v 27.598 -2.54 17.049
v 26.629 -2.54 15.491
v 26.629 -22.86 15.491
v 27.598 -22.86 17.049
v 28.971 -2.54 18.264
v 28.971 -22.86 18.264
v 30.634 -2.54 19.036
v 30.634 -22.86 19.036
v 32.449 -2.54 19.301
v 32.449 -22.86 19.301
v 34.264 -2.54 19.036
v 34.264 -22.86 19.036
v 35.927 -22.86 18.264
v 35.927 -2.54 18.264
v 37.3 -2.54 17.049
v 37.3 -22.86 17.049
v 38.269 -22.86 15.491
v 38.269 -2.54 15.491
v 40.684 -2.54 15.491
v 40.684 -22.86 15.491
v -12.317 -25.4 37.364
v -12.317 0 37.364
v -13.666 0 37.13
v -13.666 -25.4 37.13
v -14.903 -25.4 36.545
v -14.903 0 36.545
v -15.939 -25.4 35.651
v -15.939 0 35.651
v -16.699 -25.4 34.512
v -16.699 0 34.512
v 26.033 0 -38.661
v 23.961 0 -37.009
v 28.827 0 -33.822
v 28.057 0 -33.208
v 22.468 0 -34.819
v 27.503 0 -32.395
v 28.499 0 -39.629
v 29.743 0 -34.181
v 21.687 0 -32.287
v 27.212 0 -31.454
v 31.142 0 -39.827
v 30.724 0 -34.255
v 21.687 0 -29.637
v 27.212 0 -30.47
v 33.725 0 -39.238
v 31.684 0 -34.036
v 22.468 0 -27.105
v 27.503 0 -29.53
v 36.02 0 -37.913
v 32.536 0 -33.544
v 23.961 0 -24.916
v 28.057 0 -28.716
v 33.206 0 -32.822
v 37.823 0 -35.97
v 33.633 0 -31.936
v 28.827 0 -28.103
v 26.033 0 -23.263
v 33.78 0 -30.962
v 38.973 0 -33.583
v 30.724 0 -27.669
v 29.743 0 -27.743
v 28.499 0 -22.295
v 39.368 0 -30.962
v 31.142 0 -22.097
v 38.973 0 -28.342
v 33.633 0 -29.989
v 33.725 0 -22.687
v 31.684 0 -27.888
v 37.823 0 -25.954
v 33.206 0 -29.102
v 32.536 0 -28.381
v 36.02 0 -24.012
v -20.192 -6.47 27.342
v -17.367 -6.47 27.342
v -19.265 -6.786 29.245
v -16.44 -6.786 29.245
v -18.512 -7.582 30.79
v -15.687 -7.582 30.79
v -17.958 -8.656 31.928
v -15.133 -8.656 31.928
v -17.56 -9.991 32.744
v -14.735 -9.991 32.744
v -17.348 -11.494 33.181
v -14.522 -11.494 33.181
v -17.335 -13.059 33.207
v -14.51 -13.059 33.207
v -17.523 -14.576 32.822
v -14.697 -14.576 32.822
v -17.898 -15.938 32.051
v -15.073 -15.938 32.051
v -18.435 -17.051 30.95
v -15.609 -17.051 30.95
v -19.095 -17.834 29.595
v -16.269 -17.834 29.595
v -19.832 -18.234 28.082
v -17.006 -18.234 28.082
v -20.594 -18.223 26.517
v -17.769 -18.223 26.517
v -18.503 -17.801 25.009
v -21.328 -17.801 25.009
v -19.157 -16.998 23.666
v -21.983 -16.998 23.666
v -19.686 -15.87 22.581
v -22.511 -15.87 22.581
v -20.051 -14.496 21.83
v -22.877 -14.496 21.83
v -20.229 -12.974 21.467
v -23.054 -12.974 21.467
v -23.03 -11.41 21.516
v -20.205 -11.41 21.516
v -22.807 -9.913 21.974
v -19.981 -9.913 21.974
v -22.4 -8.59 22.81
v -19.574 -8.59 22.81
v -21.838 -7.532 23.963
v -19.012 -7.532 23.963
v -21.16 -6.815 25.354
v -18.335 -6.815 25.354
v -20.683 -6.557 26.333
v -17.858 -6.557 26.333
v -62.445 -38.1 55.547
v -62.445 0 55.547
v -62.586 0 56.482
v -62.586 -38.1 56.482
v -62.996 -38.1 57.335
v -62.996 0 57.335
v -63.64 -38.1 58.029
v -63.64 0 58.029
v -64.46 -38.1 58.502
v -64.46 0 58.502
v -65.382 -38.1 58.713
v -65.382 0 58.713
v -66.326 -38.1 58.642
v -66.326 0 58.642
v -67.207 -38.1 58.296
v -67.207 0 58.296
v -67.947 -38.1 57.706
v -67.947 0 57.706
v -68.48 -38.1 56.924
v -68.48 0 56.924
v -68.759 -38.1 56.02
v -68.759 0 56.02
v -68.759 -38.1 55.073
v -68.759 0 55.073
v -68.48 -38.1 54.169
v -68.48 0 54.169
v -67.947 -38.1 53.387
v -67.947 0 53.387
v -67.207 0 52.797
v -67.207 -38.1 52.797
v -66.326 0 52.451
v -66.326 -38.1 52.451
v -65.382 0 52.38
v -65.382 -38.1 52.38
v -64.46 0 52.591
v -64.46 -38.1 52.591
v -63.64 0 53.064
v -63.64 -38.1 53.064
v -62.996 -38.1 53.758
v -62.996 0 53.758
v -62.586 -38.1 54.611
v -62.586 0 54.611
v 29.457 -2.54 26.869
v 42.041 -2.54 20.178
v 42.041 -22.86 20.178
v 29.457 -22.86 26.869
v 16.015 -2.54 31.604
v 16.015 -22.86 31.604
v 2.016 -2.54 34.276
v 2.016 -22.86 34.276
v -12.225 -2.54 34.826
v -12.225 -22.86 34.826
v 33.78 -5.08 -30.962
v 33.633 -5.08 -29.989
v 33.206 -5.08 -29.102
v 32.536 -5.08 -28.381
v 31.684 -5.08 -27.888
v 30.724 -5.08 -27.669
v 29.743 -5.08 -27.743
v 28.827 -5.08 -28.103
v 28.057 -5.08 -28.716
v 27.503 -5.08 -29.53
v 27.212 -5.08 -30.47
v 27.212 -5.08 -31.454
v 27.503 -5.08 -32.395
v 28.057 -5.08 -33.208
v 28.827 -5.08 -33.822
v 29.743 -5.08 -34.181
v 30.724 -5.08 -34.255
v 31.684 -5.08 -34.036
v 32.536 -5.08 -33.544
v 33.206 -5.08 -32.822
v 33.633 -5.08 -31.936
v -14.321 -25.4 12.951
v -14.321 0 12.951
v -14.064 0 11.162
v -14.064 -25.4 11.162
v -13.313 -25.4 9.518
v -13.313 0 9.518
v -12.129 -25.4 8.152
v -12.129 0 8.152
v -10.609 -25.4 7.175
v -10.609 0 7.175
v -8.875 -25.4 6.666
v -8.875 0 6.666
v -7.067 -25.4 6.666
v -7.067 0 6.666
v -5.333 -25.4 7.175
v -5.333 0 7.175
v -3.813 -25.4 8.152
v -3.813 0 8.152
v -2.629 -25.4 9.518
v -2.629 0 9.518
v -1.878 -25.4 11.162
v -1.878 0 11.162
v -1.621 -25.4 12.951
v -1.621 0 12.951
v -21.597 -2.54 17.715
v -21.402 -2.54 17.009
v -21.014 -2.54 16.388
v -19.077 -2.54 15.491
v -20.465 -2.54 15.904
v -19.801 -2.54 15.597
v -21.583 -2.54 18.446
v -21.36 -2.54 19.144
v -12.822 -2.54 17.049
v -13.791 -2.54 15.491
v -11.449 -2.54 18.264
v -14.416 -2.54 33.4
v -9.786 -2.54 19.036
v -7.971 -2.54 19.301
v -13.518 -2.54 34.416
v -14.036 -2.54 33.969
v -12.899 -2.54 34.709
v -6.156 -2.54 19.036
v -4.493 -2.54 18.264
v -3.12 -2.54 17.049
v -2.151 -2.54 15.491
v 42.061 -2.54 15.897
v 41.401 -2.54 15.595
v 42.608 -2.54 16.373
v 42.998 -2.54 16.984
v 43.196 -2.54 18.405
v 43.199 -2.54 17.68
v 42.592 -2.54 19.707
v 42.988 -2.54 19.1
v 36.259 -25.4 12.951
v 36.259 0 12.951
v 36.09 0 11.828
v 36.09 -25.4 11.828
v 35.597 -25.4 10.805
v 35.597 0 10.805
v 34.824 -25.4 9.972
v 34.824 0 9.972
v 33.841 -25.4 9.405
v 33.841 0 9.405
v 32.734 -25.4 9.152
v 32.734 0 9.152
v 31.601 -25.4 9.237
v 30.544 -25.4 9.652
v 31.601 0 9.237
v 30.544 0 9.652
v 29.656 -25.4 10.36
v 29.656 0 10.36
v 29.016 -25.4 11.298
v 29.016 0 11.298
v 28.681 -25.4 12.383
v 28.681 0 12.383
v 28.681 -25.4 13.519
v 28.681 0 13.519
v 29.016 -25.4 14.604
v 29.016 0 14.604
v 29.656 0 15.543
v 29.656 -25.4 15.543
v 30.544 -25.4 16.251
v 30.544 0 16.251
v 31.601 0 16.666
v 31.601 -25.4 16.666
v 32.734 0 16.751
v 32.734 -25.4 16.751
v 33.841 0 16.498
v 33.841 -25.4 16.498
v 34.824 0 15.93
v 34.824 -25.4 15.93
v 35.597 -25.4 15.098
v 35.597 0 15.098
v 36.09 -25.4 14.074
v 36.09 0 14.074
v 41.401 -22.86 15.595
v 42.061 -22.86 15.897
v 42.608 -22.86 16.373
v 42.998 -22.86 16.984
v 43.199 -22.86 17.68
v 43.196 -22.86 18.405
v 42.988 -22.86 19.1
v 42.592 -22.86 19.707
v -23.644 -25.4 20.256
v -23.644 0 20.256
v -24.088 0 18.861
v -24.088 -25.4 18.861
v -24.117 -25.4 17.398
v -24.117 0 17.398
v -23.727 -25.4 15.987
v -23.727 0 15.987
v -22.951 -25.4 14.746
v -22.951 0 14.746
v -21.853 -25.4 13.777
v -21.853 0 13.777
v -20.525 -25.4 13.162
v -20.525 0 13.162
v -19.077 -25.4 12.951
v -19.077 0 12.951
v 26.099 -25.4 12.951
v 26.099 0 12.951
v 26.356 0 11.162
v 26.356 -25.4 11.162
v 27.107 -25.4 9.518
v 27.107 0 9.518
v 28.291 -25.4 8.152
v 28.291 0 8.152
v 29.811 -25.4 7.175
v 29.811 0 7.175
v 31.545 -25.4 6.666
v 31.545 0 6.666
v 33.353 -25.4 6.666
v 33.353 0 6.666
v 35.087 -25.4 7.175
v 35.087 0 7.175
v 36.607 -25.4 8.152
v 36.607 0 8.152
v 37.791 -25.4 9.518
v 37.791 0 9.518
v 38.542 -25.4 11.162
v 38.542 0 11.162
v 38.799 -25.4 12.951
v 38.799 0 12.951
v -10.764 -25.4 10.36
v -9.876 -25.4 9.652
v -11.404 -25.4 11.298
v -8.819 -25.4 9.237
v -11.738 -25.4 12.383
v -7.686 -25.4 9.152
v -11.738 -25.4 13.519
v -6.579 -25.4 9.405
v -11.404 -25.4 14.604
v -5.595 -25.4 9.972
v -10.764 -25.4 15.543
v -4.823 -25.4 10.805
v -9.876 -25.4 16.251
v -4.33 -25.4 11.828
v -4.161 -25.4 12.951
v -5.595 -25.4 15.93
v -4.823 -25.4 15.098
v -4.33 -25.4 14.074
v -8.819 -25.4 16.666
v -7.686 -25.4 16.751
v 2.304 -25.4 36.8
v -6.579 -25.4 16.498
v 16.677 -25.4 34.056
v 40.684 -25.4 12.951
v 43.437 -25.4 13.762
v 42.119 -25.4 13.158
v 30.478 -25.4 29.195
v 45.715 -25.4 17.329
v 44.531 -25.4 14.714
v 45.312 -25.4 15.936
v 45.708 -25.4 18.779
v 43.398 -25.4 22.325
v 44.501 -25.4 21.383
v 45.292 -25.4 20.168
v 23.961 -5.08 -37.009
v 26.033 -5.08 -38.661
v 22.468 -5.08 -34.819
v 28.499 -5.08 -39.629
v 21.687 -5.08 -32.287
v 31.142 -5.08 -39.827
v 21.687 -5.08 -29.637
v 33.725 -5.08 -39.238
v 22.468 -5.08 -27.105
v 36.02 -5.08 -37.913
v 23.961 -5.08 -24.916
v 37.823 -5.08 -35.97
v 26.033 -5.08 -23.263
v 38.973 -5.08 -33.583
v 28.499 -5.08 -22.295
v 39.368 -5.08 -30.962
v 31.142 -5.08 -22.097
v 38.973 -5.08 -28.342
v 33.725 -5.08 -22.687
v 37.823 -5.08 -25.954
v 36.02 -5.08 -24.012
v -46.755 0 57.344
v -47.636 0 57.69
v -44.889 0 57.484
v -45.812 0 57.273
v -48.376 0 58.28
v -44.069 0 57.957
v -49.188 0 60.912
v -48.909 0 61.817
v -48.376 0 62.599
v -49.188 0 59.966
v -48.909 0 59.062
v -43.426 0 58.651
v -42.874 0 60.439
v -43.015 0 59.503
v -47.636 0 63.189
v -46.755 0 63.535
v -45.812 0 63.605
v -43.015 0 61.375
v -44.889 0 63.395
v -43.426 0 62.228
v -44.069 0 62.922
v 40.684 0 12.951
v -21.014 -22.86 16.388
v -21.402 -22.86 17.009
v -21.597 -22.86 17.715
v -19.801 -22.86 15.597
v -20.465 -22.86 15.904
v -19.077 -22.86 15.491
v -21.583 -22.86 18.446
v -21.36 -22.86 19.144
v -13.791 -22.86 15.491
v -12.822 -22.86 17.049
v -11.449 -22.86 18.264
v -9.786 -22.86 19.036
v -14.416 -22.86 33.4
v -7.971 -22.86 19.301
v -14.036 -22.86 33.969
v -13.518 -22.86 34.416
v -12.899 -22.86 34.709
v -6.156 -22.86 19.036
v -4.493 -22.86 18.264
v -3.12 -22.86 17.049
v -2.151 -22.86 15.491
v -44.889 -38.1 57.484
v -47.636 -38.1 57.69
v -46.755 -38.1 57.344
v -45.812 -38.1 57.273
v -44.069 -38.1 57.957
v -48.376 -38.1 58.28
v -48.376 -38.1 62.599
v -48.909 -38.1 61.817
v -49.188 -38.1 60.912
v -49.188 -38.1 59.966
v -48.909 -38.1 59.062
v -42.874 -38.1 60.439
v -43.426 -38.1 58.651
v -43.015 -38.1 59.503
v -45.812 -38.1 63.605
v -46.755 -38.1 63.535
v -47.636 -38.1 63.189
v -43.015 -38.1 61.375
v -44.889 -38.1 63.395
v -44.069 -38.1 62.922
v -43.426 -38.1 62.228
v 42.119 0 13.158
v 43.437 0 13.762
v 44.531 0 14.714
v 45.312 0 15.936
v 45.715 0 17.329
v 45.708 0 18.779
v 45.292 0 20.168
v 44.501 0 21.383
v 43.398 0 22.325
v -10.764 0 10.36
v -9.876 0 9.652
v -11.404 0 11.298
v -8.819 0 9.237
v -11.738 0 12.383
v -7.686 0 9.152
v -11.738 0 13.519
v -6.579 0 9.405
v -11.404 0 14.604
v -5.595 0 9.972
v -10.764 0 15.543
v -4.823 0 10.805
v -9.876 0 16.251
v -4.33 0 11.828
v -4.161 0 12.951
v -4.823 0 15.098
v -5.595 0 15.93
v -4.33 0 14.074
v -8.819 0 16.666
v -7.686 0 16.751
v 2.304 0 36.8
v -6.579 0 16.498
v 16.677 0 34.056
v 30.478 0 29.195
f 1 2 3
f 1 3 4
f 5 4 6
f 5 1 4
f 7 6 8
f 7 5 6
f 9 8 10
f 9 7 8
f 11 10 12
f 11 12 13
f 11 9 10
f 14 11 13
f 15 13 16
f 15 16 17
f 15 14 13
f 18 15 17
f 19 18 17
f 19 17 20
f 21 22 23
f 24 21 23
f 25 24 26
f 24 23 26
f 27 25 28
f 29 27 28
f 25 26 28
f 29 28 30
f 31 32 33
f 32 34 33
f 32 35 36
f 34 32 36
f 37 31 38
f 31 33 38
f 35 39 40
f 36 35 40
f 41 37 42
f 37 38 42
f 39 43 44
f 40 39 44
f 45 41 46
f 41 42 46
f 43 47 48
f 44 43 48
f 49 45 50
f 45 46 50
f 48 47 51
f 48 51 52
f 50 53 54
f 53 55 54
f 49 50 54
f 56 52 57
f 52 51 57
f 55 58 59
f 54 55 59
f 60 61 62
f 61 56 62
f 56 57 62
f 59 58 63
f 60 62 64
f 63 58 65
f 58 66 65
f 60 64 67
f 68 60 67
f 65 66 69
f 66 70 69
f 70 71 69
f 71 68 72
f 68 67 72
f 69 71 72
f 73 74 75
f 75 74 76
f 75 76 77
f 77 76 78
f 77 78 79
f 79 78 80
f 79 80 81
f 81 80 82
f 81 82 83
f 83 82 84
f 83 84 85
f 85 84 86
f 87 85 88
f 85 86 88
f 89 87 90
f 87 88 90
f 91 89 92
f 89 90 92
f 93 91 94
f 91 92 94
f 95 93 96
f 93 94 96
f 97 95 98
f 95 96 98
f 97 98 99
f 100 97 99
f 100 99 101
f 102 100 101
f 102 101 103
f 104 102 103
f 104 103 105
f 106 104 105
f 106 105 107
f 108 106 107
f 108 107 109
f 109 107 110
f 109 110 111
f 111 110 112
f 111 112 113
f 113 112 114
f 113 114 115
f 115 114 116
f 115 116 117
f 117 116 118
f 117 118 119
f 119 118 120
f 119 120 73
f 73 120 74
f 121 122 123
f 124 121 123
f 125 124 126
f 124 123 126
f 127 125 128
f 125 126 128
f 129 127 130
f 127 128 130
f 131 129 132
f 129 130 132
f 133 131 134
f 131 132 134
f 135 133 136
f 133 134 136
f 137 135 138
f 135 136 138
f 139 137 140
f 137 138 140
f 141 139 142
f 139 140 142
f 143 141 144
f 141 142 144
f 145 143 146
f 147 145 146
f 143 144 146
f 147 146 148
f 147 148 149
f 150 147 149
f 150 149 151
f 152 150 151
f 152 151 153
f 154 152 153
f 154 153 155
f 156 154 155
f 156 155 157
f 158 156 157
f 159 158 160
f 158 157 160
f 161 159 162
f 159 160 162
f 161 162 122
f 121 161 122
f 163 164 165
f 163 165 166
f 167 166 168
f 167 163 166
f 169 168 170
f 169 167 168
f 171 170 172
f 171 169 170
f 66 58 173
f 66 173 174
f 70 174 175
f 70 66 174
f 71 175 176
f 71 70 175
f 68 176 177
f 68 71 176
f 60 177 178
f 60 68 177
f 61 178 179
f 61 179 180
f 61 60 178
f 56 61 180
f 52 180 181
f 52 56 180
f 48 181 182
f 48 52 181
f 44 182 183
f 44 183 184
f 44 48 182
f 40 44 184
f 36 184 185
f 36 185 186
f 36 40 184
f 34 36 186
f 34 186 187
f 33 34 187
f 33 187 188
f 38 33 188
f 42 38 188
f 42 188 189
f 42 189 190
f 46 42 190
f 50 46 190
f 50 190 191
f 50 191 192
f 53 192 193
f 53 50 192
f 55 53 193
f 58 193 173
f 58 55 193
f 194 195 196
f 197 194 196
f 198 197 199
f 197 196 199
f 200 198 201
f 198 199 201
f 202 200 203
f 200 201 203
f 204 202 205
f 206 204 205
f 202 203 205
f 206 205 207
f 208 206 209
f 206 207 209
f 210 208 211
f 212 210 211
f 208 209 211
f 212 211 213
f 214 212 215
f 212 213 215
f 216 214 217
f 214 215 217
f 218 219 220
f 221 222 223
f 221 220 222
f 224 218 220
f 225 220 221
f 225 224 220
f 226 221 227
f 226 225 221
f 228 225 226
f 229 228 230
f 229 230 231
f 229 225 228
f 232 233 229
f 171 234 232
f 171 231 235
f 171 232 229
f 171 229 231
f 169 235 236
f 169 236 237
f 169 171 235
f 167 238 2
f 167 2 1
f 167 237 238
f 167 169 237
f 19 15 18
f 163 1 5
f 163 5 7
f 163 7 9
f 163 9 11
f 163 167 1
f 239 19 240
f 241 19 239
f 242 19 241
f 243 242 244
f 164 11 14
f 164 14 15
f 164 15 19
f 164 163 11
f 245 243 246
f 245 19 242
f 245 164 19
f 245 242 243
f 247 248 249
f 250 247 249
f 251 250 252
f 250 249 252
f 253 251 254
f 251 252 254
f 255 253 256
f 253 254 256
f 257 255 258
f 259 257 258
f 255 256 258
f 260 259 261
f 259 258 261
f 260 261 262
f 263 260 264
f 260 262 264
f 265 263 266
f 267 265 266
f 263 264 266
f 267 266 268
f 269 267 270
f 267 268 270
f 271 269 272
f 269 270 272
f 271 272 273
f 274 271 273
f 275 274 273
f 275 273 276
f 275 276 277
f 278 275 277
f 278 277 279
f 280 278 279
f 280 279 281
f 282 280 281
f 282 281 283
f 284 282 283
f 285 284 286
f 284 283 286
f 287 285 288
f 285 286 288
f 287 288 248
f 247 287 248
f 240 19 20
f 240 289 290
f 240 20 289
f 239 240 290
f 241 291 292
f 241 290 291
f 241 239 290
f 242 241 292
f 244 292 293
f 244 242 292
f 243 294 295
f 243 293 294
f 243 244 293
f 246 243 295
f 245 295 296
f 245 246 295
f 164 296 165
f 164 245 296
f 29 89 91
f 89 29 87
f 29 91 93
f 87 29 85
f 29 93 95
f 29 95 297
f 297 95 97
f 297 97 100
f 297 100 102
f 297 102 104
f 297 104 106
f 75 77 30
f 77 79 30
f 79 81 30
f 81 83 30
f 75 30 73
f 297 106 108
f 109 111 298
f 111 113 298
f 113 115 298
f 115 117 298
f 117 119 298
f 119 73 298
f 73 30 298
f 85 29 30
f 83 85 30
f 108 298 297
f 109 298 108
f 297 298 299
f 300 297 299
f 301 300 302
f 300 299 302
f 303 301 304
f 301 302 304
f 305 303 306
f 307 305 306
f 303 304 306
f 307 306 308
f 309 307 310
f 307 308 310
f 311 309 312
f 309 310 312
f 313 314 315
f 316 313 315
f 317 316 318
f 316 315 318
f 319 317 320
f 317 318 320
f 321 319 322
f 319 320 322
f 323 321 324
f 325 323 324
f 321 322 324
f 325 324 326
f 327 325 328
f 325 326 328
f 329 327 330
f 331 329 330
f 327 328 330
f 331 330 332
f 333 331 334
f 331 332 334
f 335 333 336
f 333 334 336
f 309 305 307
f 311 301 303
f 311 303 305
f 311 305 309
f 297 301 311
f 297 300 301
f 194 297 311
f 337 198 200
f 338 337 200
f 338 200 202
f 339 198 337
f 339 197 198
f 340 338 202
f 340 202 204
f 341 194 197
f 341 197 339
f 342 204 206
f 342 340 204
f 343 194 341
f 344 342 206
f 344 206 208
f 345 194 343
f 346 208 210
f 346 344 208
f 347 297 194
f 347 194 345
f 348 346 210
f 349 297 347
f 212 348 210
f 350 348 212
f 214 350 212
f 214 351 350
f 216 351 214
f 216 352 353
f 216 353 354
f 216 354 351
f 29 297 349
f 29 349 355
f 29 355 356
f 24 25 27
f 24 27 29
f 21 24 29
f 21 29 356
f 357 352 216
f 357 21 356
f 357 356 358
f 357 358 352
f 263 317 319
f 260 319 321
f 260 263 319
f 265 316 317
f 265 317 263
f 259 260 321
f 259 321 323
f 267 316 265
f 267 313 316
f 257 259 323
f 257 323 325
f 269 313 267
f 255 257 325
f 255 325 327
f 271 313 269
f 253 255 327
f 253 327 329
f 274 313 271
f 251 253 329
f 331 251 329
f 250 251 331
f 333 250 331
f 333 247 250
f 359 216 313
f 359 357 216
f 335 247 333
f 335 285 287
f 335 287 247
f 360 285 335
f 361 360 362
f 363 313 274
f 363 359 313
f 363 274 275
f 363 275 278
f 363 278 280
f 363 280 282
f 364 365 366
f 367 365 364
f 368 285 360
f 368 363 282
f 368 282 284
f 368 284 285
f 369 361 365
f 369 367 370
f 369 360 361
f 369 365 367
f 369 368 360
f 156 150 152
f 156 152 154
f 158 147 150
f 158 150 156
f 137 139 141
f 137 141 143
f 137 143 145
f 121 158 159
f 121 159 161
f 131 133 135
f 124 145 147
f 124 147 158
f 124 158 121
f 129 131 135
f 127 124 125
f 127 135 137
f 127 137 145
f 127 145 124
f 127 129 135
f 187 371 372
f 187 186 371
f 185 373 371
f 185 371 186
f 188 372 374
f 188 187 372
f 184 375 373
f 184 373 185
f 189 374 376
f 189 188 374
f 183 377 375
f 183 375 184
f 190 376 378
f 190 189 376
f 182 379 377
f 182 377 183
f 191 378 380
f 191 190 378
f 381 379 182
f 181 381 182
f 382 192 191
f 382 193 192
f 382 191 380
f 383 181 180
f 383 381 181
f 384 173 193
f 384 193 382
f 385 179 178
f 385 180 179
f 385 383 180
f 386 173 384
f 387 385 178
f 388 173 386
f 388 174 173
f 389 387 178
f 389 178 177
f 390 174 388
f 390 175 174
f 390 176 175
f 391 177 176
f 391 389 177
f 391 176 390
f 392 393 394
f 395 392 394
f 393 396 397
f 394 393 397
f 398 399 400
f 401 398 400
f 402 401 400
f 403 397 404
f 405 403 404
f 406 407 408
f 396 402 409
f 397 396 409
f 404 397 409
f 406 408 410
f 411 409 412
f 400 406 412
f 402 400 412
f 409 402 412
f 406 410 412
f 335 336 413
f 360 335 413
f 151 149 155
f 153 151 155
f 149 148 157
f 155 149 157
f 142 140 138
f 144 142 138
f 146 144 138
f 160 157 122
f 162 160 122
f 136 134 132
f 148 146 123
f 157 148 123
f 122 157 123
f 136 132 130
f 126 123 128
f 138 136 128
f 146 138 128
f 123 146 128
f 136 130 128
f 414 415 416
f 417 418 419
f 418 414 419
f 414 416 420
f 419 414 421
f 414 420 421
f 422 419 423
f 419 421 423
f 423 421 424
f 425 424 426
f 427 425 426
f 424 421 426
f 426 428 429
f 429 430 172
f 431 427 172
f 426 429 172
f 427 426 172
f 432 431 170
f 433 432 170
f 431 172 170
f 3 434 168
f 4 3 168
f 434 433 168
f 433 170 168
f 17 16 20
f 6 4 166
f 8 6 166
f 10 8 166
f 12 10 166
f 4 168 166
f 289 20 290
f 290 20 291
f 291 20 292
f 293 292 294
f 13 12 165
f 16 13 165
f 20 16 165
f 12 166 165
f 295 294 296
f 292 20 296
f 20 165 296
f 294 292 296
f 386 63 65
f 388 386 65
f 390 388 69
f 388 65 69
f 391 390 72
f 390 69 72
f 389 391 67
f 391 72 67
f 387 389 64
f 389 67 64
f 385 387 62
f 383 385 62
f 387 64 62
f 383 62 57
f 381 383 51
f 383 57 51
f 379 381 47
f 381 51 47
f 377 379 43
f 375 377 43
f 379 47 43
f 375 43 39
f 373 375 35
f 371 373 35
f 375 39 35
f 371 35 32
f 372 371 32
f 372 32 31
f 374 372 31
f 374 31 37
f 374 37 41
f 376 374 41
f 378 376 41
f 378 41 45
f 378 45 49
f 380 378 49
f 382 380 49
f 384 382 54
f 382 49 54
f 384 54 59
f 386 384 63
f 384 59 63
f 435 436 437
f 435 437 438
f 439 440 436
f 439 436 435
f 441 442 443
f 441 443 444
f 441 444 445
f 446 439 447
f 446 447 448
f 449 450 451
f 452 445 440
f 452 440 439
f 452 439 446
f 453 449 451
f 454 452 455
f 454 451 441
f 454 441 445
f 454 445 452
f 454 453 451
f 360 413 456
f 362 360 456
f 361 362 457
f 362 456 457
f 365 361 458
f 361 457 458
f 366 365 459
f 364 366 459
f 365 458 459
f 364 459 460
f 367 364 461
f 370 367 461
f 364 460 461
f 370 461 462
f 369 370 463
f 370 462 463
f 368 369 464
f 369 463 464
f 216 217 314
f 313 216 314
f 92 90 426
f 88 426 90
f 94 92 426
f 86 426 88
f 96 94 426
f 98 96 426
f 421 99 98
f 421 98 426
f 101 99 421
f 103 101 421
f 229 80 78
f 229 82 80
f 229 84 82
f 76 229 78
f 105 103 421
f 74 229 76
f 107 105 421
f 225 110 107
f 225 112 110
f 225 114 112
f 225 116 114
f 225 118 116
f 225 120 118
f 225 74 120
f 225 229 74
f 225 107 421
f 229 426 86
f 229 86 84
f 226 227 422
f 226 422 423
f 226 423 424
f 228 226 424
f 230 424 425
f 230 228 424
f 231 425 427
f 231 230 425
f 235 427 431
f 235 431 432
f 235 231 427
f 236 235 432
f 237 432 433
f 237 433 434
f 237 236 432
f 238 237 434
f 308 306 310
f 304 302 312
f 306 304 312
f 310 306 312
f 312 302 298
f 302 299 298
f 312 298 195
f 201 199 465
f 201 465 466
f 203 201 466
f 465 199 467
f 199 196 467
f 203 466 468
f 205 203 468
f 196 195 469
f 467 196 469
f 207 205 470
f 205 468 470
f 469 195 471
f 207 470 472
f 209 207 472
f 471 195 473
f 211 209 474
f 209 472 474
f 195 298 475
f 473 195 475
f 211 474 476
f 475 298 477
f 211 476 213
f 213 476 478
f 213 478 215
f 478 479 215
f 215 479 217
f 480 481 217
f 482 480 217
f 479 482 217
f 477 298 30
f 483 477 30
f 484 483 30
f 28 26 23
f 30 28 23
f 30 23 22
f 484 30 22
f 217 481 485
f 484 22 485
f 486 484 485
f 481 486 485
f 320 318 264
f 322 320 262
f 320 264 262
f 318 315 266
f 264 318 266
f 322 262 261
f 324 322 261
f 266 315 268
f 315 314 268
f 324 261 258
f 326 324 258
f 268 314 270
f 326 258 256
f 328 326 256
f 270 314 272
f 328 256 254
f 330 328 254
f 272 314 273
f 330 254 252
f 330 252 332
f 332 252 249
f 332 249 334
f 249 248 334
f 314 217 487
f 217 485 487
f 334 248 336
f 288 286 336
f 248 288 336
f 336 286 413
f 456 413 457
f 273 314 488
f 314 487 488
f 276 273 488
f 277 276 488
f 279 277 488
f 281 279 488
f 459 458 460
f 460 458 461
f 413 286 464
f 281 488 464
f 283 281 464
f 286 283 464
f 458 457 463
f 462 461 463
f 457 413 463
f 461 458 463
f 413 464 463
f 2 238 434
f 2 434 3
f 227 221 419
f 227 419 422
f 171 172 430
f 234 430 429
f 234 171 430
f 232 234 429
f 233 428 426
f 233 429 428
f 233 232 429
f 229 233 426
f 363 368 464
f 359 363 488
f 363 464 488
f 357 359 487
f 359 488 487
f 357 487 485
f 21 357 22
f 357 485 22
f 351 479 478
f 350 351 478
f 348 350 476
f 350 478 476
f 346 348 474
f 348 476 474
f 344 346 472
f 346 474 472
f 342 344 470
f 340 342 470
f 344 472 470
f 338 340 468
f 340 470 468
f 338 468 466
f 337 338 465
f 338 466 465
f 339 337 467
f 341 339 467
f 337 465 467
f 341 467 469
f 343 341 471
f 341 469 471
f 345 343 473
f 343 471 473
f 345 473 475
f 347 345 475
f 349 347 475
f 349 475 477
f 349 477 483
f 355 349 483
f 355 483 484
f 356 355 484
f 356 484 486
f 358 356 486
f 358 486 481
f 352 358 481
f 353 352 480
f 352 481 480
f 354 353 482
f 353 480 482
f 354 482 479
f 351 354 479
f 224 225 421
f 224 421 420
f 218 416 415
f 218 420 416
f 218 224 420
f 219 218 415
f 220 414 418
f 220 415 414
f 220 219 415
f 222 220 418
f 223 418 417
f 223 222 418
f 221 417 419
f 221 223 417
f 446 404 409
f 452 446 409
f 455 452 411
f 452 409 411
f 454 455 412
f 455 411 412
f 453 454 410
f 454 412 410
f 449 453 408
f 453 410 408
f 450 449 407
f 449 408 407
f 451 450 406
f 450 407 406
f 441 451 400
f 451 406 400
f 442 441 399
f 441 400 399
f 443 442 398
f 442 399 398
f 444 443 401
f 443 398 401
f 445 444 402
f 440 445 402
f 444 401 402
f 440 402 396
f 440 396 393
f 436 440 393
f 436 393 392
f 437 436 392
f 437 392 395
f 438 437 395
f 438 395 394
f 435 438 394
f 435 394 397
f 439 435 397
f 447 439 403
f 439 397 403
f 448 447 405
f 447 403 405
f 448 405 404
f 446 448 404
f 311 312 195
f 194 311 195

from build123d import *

# Parameters (mm, degrees)
F1_DEPTH    = 25.4
F2_T        = 2.54
F2_T3_DEPTH = 30.48
F3_R        = 12.5715428013
F4_DEPTH    = 25.4
F5_R        = 3.175
F6_DEPTH    = 38.1
F8_R        = 8.89
F8_R_2      = 3.302
F9_DEPTH    = 5.08
F10_R       = 5.9052801824
F11_DEPTH   = 29.464


# Not quite as in the source:
# - a shell that OpenCascade refuses in one call is made with other operations: the cavity is built on its own and cut out


with BuildPart() as f1:
    # F0 (on Front) → F1 (new body)
    with BuildSketch(Plane.XZ):
        with BuildLine():
            ThreePointArc((40.6837563911, 12.9512595013), (45.5633080309, 16.6183278701), (43.3981157839, 22.3252847791))
            ThreePointArc((43.3981157839, 22.3252847791), (16.6771448475, 34.0559195708), (-12.3172349893, 37.3640940343))
            ThreePointArc((-12.3172349893, 37.3640940343), (-14.9032820969, 36.5451200142), (-16.6991979645, 34.5121310115))
            Line((-16.6991979645, 34.5121310115), (-23.6436870624, 20.2559263329))
            ThreePointArc((-23.6436870624, 20.2559263329), (-23.3841308643, 15.3382043129), (-19.0767124086, 12.9512595013))
            Line((-19.0767124086, 12.9512595013), (-14.3209207639, 12.9512595013))
            ThreePointArc((-14.3209207639, 12.9512595013), (-7.9709207639, 19.3012595013), (-1.6209207639, 12.9512595013))
            Line((-1.6209207639, 12.9512595013), (26.098913902, 12.9512595013))
            ThreePointArc((26.098913902, 12.9512595013), (32.448913902, 19.3012595013), (38.798913902, 12.9512595013))
            Line((38.798913902, 12.9512595013), (40.6837563911, 12.9512595013))
        make_face()
        with BuildLine():
            ThreePointArc((26.098913902, 12.9512595013), (32.448913902, 6.6012595013), (38.798913902, 12.9512595013))
            Line((38.798913902, 12.9512595013), (36.258913902, 12.9512595013))
            ThreePointArc((36.258913902, 12.9512595013), (32.448913902, 9.1412595013), (28.638913902, 12.9512595013))
            Line((28.638913902, 12.9512595013), (26.098913902, 12.9512595013))
        make_face()
        with BuildLine():
            Line((36.258913902, 12.9512595013), (38.798913902, 12.9512595013))
            ThreePointArc((38.798913902, 12.9512595013), (32.448913902, 19.3012595013), (26.098913902, 12.9512595013))
            Line((26.098913902, 12.9512595013), (28.638913902, 12.9512595013))
            ThreePointArc((28.638913902, 12.9512595013), (32.448913902, 16.7612595013), (36.258913902, 12.9512595013))
        make_face()
        with BuildLine():
            ThreePointArc((-14.3209207639, 12.9512595013), (-7.9709207639, 6.6012595013), (-1.6209207639, 12.9512595013))
            Line((-1.6209207639, 12.9512595013), (-4.1609207639, 12.9512595013))
            ThreePointArc((-4.1609207639, 12.9512595013), (-7.9709207639, 9.1412595013), (-11.7809207639, 12.9512595013))
            Line((-11.7809207639, 12.9512595013), (-14.3209207639, 12.9512595013))
        make_face()
        with BuildLine():
            Line((-4.1609207639, 12.9512595013), (-1.6209207639, 12.9512595013))
            ThreePointArc((-1.6209207639, 12.9512595013), (-7.9709207639, 19.3012595013), (-14.3209207639, 12.9512595013))
            Line((-14.3209207639, 12.9512595013), (-11.7809207639, 12.9512595013))
            ThreePointArc((-11.7809207639, 12.9512595013), (-7.9709207639, 16.7612595013), (-4.1609207639, 12.9512595013))
        make_face()
    extrude(amount=F1_DEPTH)

    # F2: shell of thickness 2.54, made by hand


with BuildPart() as f2_core1:
    # F2_t2: copy of F1
    add(f1.part)

    # the walls: a layer under each face that stays
    f2_faces = [f2_core1.faces().sort_by_distance(p)[0] for p in [
        (45.5633080309, -12.7, 16.6183278701),
        (16.6771448475, -12.7, 34.0559195708),
        (-14.9032820969, -12.7, 36.5451200142),
        (-20.1714425135, -12.7, 27.3840286722),
        (-23.3841308643, -12.7, 15.3382043129),
        (-16.6988165863, -12.7, 12.9512595013),
        (-7.9709207639, -12.7, 6.6012595013),
        (12.2389965691, -12.7, 12.9512595013),
        (32.448913902, -12.7, 6.6012595013),
        (39.7413351466, -12.7, 12.9512595013),
        (28.638913902, -12.7, 12.9512595013),
        (-11.7809207639, -12.7, 12.9512595013),
        (10.8035219912, 0, 22.0150577288),
        (10.8035219912, -25.4, 22.0150577288),
    ]]
    thicken(f2_faces, amount=-F2_T, mode=Mode.SUBTRACT)

    # F2_s4 → F2_t3 (cut)
    with BuildSketch(Plane.XZ.offset(-2.54)):
        Polygon((-14.3463207639, 12.9258595013), (-14.3209207639, 15.4912595013), (-11.7809207639, 15.4912595013), (-11.7809207639, 12.9512595013), align=None)
        Polygon((-1.5955207639, 12.9258595013), (-4.1609207639, 12.9512595013), (-4.1609207639, 15.4912595013), (-1.6209207639, 15.4912595013), align=None)
        Polygon((26.073513902, 12.9258595013), (26.098913902, 15.4912595013), (28.638913902, 15.4912595013), (28.638913902, 12.9512595013), align=None)
        Polygon((38.824313902, 12.9258595013), (36.258913902, 12.9512595013), (36.258913902, 15.4912595013), (38.798913902, 15.4912595013), align=None)
    extrude(amount=F2_T3_DEPTH, mode=Mode.SUBTRACT)


with BuildPart() as f1_1:
    add(f1.part)

    # what is left inside the walls is the cavity
    f2_cavity = [f2_core1.part.solids().sort_by_distance(p)[0] for p in [
        (16.008612, -16.086667, 31.579159),
    ]]
    add(f2_cavity, mode=Mode.SUBTRACT)

    # F10 (on Right) → F11 (cut)
    with BuildSketch(Plane.YZ):
        with Locations((-12.3756462708, 27.3415483534)):
            Circle(F10_R)
    extrude(amount=-F11_DEPTH, mode=Mode.SUBTRACT)


with BuildPart() as f4:
    # F3 (on Front) → F4 (new body)
    with BuildSketch(Plane.XZ):
        with Locations((-40.8684164286, -40.0050021708)):
            Circle(F3_R)
    extrude(amount=F4_DEPTH)


with BuildPart() as f6:
    # F5 (on Front) → F6 (new body)
    with BuildSketch(Plane.XZ):
        with Locations((-65.6197145581, 55.5465146899)):
            Circle(F5_R)
    extrude(amount=F6_DEPTH)


with BuildPart() as f6b:
    # F5 (on Front) → F6, piece 2 (new body)
    with BuildSketch(Plane.XZ):
        with Locations((-46.0489206016, 60.4392103851)):
            Circle(F5_R)
    extrude(amount=F6_DEPTH)


with BuildPart() as f9:
    # F8 (on Front) → F9 (new body)
    with BuildSketch(Plane.XZ):
        with Locations((30.4775213926, -30.9622374706)):
            Circle(F8_R)
        with Locations((30.4775213926, -30.9622374706)):
            Circle(F8_R_2, mode=Mode.SUBTRACT)
    extrude(amount=F9_DEPTH)


solid = Compound([f1_1.part, f6.part, f6b.part, f9.part])
